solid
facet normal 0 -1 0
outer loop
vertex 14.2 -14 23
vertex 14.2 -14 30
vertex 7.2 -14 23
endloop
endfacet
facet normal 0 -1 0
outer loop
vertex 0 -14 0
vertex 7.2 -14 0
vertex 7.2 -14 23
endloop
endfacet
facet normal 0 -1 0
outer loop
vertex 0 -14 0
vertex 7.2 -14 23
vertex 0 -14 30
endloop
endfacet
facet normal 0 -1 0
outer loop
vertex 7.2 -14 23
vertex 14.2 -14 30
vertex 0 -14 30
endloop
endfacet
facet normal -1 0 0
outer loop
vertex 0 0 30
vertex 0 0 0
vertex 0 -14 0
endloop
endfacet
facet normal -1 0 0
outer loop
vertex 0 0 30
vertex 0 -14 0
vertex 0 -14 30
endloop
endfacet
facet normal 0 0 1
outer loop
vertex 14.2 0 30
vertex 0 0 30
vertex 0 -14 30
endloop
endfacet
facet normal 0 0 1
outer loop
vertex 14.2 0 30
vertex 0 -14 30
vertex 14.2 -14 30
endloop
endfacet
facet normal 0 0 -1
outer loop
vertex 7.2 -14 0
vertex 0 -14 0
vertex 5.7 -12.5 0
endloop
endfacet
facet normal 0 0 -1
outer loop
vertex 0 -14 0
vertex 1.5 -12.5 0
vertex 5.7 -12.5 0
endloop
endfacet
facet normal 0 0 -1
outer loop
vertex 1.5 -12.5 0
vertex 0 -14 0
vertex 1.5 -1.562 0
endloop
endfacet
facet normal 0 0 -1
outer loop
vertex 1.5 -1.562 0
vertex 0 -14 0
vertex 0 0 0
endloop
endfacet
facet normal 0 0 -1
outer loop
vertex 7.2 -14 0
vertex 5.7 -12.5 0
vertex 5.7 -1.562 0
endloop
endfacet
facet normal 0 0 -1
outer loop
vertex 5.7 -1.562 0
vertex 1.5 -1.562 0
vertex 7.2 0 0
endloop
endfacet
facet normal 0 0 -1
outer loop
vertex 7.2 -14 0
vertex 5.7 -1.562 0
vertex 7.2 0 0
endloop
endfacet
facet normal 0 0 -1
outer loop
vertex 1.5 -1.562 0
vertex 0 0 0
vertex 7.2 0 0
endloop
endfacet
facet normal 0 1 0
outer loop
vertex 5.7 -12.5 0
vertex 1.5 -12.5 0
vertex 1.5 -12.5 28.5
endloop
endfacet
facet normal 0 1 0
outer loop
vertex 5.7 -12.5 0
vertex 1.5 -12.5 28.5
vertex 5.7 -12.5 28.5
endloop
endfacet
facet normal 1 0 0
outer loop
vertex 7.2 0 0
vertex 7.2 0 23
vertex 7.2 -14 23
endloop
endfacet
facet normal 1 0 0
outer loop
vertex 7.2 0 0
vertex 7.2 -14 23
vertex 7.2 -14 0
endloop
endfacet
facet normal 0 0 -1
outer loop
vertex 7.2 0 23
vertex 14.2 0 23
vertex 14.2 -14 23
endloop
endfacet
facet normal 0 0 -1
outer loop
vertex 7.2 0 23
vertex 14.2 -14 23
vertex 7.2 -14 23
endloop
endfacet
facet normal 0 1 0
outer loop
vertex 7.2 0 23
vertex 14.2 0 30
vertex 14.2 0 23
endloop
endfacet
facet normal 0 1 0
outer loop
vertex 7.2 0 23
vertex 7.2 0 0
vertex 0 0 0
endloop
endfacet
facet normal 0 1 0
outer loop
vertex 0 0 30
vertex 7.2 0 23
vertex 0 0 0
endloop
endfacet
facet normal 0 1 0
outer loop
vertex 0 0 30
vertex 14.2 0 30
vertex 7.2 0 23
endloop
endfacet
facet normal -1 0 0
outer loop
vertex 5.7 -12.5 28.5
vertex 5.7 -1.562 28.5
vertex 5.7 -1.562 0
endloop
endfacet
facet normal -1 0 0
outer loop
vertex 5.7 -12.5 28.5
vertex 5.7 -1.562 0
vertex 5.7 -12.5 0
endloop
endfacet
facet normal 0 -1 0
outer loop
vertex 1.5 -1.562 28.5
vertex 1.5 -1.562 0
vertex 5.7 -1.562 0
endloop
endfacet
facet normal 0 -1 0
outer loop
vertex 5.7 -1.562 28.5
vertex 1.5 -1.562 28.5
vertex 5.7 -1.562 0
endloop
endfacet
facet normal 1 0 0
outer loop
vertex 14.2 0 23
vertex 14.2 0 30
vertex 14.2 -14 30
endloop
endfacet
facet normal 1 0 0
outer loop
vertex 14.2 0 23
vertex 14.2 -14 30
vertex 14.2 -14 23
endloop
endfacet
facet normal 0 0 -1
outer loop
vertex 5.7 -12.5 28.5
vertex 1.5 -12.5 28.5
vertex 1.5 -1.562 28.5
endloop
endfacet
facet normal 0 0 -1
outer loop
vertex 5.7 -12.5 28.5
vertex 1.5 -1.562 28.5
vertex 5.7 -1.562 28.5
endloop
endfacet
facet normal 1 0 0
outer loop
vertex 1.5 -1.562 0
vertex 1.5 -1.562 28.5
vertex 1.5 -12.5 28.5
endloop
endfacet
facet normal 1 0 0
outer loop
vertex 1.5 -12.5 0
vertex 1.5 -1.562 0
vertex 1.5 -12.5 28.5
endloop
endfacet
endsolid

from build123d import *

# Parameters (mm, degrees)
PAD_DEPTH    = 14
SKETCH001_W  = 4.2
SKETCH001_H  = 10.937521
POCKET_DEPTH = 28.5


with BuildPart() as part:
    # Sketch → Pad (new body)
    with BuildSketch(Plane.XZ):
        Polygon((0, 30), (14.2, 30), (14.2, 23), (7.2, 23), (7.2, 0), (5.7, 0), (1.5, 0), (0, 0), align=None)
    extrude(amount=PAD_DEPTH)

    # Sketch001 → Pocket (cut)
    with BuildSketch(Plane(origin=(0, 0, 0), x_dir=(1, 0, 0), z_dir=(0, 0, -1))):
        with Locations((3.6, 7.031239)):
            Rectangle(SKETCH001_W, SKETCH001_H)
    extrude(amount=-POCKET_DEPTH, mode=Mode.SUBTRACT)


solid = part.part
